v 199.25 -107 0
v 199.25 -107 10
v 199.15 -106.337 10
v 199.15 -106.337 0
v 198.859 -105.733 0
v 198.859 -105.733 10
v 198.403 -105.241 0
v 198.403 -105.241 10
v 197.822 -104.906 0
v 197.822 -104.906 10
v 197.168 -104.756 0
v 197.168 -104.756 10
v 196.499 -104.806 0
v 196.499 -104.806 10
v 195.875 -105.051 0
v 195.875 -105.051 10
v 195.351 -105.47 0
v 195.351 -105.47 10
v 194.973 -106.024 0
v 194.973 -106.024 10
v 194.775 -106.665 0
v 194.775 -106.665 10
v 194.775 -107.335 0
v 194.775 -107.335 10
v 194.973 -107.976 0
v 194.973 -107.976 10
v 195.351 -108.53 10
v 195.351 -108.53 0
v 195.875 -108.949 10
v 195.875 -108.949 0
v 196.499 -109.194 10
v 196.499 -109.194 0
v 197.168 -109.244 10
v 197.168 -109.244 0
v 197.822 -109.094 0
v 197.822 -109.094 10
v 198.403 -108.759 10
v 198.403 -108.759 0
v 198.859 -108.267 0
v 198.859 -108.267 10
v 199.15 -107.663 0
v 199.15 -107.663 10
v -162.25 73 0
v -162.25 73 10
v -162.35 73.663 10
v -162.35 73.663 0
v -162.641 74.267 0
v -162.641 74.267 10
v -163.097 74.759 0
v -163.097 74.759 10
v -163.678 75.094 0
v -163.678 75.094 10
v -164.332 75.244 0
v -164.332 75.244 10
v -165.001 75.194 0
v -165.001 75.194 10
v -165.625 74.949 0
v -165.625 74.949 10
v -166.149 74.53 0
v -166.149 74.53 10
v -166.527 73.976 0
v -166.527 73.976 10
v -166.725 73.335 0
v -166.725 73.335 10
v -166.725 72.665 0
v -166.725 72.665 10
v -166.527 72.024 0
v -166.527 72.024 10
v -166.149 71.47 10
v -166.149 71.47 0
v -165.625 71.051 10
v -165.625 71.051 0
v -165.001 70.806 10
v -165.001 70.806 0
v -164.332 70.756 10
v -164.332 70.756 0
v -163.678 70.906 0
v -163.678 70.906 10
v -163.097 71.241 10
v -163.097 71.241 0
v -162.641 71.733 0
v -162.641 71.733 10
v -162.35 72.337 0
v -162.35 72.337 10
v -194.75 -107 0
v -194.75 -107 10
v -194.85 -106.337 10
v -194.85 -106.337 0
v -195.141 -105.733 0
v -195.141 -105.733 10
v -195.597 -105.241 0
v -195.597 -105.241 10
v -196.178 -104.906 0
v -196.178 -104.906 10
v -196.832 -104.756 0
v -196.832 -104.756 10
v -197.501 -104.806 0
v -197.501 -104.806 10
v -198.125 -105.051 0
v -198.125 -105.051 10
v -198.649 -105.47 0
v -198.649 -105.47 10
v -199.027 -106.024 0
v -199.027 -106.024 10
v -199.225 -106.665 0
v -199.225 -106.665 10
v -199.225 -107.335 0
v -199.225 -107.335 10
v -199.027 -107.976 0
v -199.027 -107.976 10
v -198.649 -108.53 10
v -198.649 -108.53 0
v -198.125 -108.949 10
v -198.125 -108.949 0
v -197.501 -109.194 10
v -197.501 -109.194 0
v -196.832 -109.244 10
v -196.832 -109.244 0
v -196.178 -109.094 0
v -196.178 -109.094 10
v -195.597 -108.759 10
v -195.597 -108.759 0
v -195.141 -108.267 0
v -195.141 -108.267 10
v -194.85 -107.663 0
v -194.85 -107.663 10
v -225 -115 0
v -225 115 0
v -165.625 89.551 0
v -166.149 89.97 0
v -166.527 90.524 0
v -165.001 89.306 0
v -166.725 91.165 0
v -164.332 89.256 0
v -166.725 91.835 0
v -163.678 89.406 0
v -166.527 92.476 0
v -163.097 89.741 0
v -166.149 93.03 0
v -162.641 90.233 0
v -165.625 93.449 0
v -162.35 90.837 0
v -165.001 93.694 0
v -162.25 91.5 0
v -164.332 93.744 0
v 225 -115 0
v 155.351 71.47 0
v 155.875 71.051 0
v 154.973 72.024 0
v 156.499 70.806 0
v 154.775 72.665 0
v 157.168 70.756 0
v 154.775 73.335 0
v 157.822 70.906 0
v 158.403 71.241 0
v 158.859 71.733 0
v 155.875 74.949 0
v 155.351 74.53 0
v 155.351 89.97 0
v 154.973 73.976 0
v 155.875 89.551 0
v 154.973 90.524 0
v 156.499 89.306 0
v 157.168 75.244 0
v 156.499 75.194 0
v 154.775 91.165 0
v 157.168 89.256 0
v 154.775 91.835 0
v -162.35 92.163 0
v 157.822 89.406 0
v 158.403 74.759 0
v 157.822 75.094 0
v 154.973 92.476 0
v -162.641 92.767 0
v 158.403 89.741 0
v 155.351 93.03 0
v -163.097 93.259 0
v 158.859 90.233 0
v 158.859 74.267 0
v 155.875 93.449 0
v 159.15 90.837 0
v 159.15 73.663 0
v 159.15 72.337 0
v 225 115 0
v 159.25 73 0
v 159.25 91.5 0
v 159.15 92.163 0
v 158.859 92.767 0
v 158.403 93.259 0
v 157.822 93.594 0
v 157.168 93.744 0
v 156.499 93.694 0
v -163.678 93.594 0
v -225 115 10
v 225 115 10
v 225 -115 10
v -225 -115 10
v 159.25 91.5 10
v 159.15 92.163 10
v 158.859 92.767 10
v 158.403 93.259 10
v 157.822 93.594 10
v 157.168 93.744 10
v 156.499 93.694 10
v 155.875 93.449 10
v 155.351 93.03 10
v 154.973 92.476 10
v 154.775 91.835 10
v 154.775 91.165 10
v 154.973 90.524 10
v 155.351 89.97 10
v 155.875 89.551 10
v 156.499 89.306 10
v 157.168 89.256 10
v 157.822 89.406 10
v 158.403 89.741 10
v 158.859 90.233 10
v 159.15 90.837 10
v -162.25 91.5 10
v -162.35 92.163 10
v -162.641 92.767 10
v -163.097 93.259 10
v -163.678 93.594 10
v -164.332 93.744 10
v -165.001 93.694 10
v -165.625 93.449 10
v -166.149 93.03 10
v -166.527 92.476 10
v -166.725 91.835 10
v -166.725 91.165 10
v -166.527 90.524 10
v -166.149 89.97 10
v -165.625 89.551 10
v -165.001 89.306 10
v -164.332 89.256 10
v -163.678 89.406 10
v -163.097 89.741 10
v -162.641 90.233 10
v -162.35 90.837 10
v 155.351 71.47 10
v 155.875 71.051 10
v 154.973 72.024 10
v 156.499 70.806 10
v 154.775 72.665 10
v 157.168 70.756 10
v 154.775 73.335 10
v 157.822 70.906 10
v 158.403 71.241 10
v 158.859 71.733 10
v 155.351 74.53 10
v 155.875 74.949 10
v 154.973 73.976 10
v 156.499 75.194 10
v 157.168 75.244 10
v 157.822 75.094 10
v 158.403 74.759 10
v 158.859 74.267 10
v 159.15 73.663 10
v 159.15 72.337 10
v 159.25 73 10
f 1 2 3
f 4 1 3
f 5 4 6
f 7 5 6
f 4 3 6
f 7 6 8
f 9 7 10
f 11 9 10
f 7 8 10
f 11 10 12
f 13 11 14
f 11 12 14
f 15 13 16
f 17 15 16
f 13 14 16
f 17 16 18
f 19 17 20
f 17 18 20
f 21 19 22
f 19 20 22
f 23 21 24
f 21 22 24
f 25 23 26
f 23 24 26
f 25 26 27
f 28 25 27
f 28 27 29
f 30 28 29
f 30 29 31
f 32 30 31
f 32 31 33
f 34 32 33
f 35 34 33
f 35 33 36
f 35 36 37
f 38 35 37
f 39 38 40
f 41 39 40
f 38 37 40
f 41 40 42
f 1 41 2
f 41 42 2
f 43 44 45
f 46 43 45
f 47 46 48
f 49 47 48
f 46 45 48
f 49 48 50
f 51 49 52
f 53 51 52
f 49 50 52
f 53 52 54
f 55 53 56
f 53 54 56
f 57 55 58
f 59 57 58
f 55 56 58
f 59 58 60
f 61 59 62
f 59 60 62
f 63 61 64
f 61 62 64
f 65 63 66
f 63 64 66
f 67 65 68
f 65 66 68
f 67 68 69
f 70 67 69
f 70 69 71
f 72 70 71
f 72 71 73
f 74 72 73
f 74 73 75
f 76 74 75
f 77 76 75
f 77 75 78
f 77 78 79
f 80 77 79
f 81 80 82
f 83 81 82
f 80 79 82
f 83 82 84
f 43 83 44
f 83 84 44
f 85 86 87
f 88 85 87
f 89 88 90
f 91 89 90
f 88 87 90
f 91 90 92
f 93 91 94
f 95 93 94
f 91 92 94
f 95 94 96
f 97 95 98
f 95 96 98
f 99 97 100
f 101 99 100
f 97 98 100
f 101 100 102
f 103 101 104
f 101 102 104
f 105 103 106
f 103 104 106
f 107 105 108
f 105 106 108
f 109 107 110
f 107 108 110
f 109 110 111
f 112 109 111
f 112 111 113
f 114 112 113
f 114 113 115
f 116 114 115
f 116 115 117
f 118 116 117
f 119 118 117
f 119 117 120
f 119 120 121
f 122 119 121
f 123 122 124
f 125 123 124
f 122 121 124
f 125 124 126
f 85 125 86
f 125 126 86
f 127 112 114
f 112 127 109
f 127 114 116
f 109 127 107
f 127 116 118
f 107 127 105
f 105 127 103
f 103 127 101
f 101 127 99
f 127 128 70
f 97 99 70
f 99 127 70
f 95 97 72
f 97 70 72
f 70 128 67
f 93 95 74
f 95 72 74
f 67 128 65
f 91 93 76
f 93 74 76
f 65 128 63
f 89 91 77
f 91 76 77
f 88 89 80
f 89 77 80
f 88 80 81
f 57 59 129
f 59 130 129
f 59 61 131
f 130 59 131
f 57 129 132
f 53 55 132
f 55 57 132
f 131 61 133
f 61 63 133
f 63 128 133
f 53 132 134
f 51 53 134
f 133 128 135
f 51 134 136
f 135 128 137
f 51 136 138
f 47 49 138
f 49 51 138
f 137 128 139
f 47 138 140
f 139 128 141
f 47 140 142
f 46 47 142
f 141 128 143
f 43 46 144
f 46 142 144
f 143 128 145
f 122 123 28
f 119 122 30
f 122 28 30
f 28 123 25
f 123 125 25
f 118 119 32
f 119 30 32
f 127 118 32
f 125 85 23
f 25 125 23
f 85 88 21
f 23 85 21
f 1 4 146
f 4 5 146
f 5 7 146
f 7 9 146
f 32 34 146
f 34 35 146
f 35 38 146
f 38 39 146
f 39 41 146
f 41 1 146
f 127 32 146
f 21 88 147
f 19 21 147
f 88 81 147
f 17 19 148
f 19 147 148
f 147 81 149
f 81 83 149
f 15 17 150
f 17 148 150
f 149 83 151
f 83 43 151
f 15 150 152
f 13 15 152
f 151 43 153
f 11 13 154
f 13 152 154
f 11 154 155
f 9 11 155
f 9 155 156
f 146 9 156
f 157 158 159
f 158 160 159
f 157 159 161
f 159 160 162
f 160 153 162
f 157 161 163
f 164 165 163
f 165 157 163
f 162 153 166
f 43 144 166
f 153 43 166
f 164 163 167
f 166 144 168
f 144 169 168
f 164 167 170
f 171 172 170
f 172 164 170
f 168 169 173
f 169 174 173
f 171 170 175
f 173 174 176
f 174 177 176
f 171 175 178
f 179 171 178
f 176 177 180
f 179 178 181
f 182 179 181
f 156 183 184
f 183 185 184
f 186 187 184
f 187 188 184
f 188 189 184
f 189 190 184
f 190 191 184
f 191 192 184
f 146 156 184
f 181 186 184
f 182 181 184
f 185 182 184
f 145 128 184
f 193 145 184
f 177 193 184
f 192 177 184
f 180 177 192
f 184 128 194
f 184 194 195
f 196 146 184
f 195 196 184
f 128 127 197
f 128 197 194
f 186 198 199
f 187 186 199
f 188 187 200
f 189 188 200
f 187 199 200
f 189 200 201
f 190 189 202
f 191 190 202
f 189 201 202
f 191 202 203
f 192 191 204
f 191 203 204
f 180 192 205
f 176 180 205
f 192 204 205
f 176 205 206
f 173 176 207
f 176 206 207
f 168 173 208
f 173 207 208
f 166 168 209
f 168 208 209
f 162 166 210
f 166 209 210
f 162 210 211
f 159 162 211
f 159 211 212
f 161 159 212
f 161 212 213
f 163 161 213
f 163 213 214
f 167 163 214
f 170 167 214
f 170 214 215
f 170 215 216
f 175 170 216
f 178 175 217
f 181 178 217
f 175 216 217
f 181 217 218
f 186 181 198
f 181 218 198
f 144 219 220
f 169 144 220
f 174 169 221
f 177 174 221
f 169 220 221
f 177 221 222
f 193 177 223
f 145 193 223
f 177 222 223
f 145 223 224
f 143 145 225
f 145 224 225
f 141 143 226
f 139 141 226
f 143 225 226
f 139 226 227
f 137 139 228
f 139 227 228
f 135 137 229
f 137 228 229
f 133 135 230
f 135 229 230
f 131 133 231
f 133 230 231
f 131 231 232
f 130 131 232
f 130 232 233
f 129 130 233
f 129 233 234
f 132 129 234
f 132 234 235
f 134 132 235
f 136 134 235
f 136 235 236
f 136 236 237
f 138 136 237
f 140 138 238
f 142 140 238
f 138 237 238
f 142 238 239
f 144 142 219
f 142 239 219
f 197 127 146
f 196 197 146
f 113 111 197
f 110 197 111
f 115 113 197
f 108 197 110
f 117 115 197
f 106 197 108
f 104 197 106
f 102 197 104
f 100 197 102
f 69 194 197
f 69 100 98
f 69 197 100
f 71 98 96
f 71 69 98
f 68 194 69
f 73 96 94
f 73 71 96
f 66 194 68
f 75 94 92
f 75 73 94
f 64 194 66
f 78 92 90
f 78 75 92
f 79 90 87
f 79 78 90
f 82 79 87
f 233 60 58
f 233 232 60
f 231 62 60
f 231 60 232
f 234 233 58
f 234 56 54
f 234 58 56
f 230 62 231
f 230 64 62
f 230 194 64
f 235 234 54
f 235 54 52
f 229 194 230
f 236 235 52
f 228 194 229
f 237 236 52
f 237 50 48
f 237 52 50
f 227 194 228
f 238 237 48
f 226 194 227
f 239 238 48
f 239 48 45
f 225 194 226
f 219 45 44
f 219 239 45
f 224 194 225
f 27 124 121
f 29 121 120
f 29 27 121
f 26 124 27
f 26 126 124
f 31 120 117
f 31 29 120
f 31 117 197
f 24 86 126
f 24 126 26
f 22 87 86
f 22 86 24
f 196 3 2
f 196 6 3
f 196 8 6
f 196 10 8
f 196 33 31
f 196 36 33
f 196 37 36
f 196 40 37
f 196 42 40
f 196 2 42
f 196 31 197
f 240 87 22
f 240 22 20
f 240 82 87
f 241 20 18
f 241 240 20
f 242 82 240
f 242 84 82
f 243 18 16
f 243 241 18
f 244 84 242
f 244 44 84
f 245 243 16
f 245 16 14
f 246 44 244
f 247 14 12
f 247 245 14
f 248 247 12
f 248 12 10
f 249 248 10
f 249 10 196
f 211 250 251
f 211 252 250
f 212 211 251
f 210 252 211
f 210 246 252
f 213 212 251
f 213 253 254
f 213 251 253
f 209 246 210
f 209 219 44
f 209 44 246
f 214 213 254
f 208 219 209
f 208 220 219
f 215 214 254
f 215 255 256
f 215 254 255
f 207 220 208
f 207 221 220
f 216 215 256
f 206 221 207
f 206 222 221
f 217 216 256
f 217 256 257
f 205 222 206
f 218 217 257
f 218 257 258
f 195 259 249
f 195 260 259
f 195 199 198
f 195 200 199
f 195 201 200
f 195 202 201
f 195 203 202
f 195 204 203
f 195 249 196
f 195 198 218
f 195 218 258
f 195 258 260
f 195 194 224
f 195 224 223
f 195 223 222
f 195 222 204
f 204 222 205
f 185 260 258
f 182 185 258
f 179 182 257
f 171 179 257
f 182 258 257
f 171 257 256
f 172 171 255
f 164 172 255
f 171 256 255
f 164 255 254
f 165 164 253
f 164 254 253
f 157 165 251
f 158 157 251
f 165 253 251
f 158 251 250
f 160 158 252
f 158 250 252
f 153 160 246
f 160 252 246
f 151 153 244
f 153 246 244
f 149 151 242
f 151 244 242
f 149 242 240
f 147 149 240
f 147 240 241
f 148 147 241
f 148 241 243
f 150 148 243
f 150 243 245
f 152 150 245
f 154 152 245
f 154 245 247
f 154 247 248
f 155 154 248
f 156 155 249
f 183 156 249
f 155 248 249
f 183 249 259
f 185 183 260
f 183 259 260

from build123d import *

# Parameters (mm, degrees)
SCHIZZO1_W                   = 450
SCHIZZO1_H                   = 230
ESTRUSIONE_ESTRUSIONE1_DEPTH = 10
SCHIZZO2_R                   = 2.25
TAGLIO_ESTRUSIONE1_DEPTH     = 10
SCHIZZO3_R                   = 2.25
TAGLIO_ESTRUSIONE2_DEPTH     = 10


with BuildPart() as part:
    # Schizzo1 → Estrusione-Estrusione1 (new body)
    with BuildSketch(Plane.XY):
        Rectangle(SCHIZZO1_W, SCHIZZO1_H)
    extrude(amount=ESTRUSIONE_ESTRUSIONE1_DEPTH)

    # Schizzo2 → Taglio-Estrusione1 (cut)
    with BuildSketch(Plane.XY.offset(10)):
        with Locations((-164.5, 91.5)):
            Circle(SCHIZZO2_R)
        with Locations((-164.5, 73)):
            Circle(SCHIZZO2_R)
        with Locations((157, 91.5)):
            Circle(SCHIZZO2_R)
        with Locations((157, 73)):
            Circle(SCHIZZO2_R)
    extrude(amount=-TAGLIO_ESTRUSIONE1_DEPTH, mode=Mode.SUBTRACT)

    # Schizzo3 → Taglio-Estrusione2 (cut)
    with BuildSketch(Plane.XY.offset(10)):
        with Locations((-197, -107)):
            Circle(SCHIZZO3_R)
        with Locations((197, -107)):
            Circle(SCHIZZO3_R)
    extrude(amount=-TAGLIO_ESTRUSIONE2_DEPTH, mode=Mode.SUBTRACT)


solid = part.part
